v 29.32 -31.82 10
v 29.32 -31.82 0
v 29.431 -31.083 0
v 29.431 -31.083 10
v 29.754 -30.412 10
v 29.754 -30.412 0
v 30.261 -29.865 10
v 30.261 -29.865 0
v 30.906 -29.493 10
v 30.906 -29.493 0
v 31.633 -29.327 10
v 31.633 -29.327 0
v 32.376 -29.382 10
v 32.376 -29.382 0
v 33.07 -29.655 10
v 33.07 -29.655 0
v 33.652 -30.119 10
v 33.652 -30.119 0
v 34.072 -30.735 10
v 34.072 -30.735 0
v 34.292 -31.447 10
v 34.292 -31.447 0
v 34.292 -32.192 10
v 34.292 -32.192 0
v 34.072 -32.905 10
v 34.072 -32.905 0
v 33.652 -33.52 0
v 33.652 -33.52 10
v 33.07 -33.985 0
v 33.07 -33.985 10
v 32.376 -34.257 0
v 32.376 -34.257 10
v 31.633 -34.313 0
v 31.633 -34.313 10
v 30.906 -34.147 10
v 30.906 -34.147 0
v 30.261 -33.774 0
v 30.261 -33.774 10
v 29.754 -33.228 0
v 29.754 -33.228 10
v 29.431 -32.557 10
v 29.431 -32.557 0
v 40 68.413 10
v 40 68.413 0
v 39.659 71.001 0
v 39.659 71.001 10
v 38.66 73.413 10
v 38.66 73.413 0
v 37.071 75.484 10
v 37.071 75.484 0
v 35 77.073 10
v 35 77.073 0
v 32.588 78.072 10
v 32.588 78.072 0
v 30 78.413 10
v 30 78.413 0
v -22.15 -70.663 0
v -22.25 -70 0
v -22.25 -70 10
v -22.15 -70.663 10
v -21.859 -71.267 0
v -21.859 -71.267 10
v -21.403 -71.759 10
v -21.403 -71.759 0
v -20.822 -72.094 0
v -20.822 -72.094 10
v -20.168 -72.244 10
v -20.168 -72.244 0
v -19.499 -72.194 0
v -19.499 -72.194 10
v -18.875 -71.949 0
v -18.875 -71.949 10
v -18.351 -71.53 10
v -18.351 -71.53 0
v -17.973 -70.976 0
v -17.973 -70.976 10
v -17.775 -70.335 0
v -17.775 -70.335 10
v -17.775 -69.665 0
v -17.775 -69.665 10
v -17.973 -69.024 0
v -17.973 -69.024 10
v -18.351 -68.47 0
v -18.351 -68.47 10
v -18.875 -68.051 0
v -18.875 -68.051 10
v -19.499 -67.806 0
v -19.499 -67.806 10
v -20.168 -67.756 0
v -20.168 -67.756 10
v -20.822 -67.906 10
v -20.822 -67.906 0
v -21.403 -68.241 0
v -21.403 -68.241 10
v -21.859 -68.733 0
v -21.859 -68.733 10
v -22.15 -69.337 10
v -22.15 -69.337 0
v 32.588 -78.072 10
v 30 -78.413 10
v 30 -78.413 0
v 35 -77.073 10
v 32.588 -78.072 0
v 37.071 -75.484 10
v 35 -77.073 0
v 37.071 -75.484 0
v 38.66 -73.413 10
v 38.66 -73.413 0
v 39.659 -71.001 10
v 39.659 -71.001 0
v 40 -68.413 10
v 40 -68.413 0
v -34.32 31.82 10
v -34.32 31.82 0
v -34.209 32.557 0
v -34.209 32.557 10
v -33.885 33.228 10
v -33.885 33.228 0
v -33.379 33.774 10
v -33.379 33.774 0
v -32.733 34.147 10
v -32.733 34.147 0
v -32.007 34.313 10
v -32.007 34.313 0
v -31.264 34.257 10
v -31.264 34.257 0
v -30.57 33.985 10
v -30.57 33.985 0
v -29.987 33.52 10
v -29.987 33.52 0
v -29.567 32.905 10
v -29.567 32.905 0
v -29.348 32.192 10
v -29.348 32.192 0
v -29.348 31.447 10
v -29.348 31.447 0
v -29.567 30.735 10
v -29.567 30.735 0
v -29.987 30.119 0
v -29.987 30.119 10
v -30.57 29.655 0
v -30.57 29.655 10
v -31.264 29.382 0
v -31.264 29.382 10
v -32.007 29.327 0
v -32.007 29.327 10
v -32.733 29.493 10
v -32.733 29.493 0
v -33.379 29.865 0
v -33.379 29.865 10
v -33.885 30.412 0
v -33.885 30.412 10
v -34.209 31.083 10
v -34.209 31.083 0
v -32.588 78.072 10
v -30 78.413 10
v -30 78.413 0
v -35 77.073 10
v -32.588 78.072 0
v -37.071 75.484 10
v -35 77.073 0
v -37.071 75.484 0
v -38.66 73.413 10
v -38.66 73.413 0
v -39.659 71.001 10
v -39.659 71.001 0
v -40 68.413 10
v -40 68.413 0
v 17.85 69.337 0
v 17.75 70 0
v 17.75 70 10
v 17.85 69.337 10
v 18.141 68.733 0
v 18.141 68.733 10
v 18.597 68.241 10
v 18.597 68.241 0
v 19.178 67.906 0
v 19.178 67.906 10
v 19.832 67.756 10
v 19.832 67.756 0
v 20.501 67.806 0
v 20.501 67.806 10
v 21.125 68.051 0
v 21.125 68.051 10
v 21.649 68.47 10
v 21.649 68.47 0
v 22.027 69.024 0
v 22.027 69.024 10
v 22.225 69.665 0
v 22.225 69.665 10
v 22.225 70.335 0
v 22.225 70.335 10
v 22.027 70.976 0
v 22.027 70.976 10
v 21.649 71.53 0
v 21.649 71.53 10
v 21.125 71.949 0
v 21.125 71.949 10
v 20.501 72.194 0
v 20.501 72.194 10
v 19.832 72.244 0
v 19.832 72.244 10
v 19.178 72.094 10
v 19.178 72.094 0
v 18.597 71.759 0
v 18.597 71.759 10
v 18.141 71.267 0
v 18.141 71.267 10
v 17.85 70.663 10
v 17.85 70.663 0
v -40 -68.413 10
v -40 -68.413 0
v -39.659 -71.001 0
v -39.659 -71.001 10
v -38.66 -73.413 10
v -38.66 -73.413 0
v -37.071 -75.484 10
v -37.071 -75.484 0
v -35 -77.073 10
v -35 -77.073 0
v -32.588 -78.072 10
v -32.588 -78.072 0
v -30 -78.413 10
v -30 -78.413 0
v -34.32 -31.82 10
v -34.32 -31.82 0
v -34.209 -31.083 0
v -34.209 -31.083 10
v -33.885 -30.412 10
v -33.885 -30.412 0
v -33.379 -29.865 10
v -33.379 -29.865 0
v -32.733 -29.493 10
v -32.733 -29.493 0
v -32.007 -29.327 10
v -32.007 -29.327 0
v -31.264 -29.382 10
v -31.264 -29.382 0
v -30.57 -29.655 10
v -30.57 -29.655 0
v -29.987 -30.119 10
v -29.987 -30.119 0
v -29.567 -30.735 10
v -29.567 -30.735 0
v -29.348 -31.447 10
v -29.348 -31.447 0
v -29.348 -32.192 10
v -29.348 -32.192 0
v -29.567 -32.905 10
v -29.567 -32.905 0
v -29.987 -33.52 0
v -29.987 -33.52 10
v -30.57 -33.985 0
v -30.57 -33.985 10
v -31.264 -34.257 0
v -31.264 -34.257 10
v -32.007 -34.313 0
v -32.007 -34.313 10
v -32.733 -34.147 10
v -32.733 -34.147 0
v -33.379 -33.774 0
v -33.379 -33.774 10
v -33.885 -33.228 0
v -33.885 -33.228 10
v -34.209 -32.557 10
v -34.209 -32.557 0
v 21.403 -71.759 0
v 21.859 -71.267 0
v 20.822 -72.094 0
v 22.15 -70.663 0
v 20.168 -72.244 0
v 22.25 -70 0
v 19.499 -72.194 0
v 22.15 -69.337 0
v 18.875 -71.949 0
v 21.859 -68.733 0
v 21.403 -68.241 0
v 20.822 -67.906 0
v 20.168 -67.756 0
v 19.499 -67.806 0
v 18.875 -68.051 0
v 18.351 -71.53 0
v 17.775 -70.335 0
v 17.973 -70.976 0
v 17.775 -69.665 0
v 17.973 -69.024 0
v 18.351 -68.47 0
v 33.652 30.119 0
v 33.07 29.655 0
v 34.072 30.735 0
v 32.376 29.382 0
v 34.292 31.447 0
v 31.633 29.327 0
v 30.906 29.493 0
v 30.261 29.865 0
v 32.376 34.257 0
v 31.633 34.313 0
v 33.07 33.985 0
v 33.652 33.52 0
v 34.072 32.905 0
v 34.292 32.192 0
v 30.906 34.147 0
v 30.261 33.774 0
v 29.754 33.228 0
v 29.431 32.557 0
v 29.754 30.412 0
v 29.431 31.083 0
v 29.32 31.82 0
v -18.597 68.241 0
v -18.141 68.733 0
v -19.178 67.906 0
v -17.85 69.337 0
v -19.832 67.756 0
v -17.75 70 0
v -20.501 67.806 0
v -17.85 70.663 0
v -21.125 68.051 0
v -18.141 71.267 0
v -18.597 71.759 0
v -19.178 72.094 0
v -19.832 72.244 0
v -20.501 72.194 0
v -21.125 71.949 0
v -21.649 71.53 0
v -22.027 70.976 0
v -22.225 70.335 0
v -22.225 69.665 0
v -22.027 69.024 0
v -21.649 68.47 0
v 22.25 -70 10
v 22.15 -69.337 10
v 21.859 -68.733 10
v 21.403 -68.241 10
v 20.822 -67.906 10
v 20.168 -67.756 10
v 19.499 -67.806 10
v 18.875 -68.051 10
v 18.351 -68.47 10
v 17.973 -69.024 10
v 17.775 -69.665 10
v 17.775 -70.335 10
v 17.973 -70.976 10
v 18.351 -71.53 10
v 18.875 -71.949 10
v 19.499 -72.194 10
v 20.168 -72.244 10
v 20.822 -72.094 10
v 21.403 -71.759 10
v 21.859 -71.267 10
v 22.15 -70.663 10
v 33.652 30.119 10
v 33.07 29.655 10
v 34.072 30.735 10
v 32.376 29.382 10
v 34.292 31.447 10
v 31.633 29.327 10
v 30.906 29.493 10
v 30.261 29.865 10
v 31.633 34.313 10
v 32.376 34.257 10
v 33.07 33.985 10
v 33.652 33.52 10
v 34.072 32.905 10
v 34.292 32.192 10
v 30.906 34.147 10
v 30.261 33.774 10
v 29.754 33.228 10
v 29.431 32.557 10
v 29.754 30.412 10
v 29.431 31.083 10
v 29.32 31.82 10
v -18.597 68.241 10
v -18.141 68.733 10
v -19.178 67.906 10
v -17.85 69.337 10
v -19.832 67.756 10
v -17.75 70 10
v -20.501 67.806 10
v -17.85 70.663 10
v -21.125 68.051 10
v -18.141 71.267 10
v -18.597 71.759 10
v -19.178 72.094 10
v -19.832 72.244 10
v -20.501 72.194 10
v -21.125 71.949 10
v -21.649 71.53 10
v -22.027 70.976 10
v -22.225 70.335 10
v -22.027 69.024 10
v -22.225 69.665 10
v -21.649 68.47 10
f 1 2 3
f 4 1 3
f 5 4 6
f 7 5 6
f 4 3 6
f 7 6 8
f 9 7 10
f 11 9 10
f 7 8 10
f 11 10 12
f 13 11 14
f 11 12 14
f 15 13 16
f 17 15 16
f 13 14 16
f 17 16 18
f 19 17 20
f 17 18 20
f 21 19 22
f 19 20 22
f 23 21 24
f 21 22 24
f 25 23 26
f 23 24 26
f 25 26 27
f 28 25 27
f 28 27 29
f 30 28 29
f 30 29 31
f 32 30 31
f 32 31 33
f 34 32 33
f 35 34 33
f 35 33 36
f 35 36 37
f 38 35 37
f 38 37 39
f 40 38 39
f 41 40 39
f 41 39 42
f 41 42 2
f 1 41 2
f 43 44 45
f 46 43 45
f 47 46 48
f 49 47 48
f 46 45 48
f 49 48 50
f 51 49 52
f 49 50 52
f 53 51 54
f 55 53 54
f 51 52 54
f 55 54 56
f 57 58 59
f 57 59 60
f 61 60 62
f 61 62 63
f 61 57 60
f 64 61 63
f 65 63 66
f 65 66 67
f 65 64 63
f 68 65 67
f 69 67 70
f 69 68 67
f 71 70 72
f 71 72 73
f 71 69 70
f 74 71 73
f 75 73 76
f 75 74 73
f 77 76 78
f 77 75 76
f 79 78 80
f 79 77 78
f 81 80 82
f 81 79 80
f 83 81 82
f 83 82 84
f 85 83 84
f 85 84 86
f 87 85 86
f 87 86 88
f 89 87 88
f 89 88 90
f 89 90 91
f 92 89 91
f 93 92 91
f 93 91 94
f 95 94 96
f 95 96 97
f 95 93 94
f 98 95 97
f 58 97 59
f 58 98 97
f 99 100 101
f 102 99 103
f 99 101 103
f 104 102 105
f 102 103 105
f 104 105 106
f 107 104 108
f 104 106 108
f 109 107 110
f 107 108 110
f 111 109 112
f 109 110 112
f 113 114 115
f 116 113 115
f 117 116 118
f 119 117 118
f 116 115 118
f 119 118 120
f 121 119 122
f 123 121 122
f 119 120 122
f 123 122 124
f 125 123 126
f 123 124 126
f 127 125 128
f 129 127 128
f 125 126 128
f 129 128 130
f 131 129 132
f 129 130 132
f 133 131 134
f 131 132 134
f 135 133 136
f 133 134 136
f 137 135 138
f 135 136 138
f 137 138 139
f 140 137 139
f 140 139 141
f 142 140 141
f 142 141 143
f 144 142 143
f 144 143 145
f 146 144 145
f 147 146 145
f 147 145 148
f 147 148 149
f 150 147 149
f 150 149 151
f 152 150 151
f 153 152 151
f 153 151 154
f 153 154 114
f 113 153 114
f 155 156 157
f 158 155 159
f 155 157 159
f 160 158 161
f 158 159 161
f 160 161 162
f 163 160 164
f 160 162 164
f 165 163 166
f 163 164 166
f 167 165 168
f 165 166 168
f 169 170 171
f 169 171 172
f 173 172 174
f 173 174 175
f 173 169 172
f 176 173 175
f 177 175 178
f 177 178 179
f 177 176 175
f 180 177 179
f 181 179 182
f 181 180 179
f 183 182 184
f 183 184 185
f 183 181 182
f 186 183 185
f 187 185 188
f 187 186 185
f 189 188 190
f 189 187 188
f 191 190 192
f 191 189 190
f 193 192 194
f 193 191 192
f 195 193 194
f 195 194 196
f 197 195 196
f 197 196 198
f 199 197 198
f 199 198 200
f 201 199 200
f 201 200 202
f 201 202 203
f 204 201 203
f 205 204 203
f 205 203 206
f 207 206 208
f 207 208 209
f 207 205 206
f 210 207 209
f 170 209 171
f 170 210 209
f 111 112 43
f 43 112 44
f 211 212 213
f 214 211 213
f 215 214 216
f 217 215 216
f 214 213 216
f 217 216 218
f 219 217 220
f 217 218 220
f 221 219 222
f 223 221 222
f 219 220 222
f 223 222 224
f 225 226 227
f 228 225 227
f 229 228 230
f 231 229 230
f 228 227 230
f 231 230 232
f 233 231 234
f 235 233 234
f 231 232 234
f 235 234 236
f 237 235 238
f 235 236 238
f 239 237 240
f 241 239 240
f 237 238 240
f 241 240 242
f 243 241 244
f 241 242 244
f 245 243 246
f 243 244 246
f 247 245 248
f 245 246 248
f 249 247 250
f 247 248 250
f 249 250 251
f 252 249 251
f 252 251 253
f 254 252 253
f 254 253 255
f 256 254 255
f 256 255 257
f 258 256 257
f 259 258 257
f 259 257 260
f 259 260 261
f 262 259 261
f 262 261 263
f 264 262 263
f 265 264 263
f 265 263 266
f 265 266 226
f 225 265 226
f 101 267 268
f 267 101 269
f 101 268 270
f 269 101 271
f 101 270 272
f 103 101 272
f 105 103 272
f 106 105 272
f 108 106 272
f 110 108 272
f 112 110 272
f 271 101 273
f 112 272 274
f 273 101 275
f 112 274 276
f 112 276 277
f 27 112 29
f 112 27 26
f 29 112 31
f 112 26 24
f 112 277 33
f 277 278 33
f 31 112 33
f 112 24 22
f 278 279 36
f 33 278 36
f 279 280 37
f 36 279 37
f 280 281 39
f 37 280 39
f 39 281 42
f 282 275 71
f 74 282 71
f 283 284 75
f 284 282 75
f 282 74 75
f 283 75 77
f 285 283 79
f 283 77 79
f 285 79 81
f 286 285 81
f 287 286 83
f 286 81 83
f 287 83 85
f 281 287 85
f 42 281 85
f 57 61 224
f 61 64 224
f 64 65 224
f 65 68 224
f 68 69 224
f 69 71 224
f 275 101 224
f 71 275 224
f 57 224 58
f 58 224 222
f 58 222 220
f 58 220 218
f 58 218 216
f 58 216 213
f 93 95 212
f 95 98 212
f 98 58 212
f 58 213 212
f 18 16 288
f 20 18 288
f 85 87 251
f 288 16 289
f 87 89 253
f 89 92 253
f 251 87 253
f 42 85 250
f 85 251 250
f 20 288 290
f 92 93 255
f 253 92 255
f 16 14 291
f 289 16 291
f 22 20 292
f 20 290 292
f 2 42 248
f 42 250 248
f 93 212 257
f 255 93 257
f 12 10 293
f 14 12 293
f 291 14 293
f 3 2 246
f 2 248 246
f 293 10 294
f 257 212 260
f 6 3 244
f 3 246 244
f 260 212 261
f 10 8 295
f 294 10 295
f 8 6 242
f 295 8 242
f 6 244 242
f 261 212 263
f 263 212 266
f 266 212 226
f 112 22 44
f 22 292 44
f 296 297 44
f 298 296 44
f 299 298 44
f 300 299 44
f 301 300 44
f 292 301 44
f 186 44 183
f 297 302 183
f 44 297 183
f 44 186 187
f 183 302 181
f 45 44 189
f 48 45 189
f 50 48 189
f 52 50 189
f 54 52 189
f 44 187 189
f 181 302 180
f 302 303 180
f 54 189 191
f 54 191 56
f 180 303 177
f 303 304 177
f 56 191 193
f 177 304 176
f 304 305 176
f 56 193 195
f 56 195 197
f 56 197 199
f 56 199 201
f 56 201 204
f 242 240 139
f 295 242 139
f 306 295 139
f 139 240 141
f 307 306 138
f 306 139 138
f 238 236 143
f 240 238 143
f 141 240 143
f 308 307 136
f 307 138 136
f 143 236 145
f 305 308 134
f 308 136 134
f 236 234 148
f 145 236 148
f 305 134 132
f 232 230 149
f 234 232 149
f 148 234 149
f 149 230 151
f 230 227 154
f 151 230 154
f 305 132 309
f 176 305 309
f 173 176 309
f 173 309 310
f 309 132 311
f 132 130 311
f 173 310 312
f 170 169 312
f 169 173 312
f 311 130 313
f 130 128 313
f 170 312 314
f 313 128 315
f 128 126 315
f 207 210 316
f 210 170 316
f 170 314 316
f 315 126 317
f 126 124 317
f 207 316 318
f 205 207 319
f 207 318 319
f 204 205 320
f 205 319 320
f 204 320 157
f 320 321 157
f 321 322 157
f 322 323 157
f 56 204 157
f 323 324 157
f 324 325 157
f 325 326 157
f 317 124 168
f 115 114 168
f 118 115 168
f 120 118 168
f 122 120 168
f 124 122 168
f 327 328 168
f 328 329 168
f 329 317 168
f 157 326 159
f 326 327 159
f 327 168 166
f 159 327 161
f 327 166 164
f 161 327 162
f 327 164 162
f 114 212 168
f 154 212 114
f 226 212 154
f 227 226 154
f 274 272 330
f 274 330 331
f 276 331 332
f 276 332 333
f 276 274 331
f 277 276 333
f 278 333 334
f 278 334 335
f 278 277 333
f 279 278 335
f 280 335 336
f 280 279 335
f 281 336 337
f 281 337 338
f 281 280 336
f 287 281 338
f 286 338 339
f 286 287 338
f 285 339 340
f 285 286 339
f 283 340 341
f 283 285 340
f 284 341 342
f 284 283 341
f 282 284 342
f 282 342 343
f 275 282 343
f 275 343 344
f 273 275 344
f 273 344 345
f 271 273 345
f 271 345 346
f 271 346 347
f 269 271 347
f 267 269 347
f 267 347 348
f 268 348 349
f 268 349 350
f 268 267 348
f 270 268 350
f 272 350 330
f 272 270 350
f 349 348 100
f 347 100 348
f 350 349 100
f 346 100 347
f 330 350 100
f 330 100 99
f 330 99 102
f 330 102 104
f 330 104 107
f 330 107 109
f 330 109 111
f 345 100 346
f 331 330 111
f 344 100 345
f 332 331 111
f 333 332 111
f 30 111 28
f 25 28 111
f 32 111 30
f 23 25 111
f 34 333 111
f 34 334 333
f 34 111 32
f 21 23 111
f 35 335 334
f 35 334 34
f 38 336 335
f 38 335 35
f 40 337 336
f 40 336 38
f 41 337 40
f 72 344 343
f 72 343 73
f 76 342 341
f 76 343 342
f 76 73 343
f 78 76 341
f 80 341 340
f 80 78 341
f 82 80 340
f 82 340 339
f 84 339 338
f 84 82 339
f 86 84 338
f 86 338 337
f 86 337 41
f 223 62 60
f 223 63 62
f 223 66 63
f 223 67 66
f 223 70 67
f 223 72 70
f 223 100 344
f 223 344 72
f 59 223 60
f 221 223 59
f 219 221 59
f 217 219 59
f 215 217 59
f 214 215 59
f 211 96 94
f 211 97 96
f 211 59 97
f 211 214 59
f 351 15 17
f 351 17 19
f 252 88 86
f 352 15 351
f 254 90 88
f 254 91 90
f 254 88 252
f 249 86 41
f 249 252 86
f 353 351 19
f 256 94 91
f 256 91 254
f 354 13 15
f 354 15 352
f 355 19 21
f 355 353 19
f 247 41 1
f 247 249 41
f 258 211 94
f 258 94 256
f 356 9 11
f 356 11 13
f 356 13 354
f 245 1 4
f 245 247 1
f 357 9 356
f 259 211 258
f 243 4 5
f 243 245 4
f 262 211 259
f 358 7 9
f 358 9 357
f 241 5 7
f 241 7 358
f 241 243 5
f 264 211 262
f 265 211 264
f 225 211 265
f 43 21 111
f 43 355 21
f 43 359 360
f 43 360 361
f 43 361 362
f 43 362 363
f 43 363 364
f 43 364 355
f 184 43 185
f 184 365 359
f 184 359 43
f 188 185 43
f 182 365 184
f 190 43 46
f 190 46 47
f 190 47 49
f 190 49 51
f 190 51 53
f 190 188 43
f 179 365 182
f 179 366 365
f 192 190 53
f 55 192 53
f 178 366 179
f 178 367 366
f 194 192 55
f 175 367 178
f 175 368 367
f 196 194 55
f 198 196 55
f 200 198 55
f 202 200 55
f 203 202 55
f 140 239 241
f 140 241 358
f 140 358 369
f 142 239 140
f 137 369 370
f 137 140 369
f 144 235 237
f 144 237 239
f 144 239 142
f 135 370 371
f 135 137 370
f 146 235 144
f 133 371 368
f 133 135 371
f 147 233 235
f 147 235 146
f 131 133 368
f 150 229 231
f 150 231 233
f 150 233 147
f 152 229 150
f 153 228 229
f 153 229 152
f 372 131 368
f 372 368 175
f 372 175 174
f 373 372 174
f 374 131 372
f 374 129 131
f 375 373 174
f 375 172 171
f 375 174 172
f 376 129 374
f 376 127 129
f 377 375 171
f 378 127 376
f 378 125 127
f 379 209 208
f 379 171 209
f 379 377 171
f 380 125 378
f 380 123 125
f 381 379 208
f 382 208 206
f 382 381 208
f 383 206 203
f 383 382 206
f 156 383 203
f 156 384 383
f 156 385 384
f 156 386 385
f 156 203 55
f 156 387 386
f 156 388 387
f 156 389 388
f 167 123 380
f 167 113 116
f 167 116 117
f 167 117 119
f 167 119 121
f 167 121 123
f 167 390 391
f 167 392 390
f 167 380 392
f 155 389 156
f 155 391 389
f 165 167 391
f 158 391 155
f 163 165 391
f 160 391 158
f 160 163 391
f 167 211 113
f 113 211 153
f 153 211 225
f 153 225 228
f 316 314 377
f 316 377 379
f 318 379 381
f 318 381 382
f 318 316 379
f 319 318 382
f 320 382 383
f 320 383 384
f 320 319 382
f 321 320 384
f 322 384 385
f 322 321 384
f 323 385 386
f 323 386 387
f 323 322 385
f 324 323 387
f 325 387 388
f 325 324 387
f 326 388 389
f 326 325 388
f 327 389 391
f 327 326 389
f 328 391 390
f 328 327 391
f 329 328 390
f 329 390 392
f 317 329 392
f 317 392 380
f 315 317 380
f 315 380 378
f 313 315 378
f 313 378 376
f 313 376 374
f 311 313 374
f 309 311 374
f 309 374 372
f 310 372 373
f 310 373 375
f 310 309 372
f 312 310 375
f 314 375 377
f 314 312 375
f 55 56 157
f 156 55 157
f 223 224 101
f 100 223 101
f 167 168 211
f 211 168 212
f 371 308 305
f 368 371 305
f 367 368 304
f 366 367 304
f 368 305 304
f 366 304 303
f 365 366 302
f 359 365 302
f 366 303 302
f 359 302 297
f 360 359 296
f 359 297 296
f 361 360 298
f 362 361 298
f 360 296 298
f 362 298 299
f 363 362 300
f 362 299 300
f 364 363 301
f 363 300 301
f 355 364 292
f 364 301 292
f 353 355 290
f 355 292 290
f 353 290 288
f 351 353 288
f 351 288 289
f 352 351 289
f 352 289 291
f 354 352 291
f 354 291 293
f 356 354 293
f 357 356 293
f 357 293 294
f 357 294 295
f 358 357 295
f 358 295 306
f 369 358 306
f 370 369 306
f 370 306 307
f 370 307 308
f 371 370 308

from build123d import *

# Parameters (mm, degrees)
SKETCH1_R           = 2.25
BOSS_EXTRUDE1_DEPTH = 10
M6_TAPPED_HOLE1_D   = 5


with BuildPart() as part:
    # Sketch1 → Boss-Extrude1 (new body)
    with BuildSketch(Plane(origin=(0, 0, 0), x_dir=(0, 1, 0), z_dir=(0, 0, 1))):
        with BuildLine():
            Line((68.412788105, 40), (-68.412788105, 40))
            ThreePointArc((-68.412788105, 40), (-75.483855917, 37.071067812), (-78.412788105, 30))
            Line((-78.412788105, 30), (-78.412788105, -30))
            ThreePointArc((-78.412788105, -30), (-75.483855917, -37.071067812), (-68.412788105, -40))
            Line((-68.412788105, -40), (68.412788105, -40))
            ThreePointArc((68.412788105, -40), (75.483855917, -37.071067812), (78.412788105, -30))
            Line((78.412788105, -30), (78.412788105, 30))
            ThreePointArc((78.412788105, 30), (75.483855917, 37.071067812), (68.412788105, 40))
        make_face()
        with Locations(Location((70, 20, 0), (0, 0, 270))):
            Circle(SKETCH1_R, mode=Mode.SUBTRACT)
        with Locations(Location((70, -20, 0), (0, 0, 90))):
            Circle(SKETCH1_R, mode=Mode.SUBTRACT)
        with Locations(Location((-70, -20, 0), (0, 0, 270))):
            Circle(SKETCH1_R, mode=Mode.SUBTRACT)
        with Locations(Location((-70, 20, 0), (0, 0, 90))):
            Circle(SKETCH1_R, mode=Mode.SUBTRACT)
    extrude(amount=BOSS_EXTRUDE1_DEPTH)

    # M6 Tapped Hole1 (through all)
    with Locations(Plane.XY.offset(10)):
        with Locations((-31.819805153, -31.819805153), (31.819805153, 31.819805153), (-31.819805153, 31.819805153), (31.819805153, -31.819805153)):
            Hole(M6_TAPPED_HOLE1_D / 2)


solid = part.part
